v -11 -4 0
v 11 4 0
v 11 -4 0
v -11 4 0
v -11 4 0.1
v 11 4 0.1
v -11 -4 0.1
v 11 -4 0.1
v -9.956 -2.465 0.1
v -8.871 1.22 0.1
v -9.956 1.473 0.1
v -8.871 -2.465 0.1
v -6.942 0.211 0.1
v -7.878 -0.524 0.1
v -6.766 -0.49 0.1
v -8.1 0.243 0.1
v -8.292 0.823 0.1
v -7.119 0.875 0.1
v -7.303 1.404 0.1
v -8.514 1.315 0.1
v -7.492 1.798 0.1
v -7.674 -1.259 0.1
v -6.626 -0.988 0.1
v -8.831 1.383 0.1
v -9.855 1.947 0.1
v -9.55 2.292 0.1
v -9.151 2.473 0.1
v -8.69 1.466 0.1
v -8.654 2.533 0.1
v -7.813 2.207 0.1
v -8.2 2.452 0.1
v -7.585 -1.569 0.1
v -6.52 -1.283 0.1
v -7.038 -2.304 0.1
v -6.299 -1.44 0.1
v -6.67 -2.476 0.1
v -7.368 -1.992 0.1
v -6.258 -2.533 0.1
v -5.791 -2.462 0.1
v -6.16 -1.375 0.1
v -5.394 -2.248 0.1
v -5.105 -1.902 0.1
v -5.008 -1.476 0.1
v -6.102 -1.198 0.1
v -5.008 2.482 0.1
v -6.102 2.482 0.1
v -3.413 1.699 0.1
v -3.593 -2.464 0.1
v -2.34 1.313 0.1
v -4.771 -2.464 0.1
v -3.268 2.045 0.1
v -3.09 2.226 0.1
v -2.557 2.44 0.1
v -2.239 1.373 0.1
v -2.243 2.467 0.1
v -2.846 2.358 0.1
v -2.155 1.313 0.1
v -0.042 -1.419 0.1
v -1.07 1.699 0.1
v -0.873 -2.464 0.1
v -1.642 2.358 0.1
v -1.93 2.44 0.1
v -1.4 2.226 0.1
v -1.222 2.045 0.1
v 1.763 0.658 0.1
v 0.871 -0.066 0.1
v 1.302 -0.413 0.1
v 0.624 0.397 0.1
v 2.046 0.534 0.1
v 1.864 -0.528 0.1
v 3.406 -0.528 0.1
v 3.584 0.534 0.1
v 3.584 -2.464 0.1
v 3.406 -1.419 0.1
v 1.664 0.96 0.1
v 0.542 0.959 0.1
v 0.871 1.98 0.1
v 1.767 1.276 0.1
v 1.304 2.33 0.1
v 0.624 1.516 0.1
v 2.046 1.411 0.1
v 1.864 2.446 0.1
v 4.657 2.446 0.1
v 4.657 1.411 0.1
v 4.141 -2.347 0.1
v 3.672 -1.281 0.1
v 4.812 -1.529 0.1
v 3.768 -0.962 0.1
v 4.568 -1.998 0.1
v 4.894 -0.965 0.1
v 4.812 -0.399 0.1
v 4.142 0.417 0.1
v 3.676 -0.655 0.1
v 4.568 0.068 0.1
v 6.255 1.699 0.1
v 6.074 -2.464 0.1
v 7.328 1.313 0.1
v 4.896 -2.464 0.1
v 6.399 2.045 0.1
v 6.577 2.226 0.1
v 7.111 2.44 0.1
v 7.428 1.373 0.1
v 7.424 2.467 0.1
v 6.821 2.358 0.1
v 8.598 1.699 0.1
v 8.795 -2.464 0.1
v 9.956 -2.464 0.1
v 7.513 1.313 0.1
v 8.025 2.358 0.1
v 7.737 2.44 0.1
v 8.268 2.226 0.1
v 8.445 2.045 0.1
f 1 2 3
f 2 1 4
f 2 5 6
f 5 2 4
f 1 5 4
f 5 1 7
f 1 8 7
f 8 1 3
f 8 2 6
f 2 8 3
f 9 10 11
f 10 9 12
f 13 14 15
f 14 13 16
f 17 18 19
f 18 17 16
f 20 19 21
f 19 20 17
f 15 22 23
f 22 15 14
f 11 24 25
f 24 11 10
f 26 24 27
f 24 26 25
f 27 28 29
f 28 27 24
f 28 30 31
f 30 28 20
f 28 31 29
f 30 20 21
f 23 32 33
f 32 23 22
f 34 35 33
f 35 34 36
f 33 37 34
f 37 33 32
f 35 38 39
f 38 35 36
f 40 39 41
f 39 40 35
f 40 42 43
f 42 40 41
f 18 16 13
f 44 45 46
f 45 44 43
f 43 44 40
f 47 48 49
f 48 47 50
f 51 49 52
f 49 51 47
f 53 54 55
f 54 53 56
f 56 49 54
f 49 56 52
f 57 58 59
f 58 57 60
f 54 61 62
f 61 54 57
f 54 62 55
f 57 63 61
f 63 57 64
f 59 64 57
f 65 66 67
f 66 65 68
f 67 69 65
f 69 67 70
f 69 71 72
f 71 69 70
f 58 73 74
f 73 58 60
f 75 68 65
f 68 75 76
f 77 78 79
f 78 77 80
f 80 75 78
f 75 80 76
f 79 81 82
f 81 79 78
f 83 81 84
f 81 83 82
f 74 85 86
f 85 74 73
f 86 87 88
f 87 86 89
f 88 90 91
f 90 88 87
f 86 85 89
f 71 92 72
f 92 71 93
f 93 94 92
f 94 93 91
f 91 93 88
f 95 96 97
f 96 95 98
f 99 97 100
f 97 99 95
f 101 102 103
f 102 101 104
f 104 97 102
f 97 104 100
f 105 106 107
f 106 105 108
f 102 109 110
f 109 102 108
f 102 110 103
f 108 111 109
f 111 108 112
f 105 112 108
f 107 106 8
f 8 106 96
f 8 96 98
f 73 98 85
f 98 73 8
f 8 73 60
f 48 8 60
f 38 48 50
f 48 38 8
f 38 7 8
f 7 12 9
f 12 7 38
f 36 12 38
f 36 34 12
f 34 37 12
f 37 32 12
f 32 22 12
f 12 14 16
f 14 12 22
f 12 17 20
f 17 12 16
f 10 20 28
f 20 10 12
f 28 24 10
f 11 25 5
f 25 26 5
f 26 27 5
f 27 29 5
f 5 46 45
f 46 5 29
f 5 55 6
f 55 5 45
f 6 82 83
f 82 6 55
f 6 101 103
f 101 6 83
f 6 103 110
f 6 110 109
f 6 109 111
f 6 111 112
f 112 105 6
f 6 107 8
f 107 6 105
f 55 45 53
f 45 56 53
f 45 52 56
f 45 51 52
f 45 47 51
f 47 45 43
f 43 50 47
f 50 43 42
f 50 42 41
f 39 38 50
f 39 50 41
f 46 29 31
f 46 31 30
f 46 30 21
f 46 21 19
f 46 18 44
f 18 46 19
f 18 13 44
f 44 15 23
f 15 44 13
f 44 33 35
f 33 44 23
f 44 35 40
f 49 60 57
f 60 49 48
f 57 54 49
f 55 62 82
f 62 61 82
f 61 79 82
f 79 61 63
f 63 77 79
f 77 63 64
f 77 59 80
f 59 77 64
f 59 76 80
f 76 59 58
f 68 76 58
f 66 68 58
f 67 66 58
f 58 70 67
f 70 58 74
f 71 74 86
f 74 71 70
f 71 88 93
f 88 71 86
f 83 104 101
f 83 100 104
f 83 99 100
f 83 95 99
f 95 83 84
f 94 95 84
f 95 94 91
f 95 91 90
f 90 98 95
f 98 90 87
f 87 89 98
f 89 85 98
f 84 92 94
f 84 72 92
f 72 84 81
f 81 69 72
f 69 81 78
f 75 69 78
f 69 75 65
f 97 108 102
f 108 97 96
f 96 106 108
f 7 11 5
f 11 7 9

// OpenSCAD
// file: ../p/box5-12.scad
use <../lib.scad>
function ldraw_lib__box5_12() = [
// 0 Box with 5 Faces without Any Edges
// 0 Name: box5-12.dat
// 0 Author: Chris Dee [cwdee]
// 0 !LDRAW_ORG Primitive UPDATE 2009-02
// 0 !LICENSE Licensed under CC BY 4.0 : see CAreadme.txt
// 
// 0 BFC CERTIFY CCW
  [0,"BFC","CERTIFY"],
  [0,"BFC","CCW"],
// 
// 0 !HISTORY 2009-09-03 [PTadmin] Official Update 2009-02
// 
// 
// 4 16 1 1 1 1 1 -1 -1 1 -1 -1 1 1
  [4,16,1,1,1,1,1,-1,-1,1,-1,-1,1,1],
// 4 16 -1 0 1 1 0 1 1 1 1 -1 1 1
  [4,16,-1,0,1,1,0,1,1,1,1,-1,1,1],
// 4 16 -1 0 -1 -1 0 1 -1 1 1 -1 1 -1
  [4,16,-1,0,-1,-1,0,1,-1,1,1,-1,1,-1],
// 4 16 1 0 -1 -1 0 -1 -1 1 -1 1 1 -1
  [4,16,1,0,-1,-1,0,-1,-1,1,-1,1,1,-1],
// 4 16 1 0 1 1 0 -1 1 1 -1 1 1 1
  [4,16,1,0,1,1,0,-1,1,1,-1,1,1,1],
// 0
];
module ldraw_lib__box5_12(step=0, col=false, unit=2/5, alt=false, line=0.2, solid=!$preview)
    makepoly(ldraw_lib__box5_12(), step=step, col=col, unit=unit, alt=alt, line=line, solid=solid);
ldraw_lib__box5_12(line=0.2);
// main file
use <../lib.scad>
use <../p/box5-12.scad>
function ldraw_lib__6342851e() = [
// 0 Sticker  1 x  2.8 with Dark Bluish Grey NASA Worm Logo
// 0 Name: 6342851e.dat
// 0 Author: Orion Pobursky [OrionP]
// 0 !LDRAW_ORG Part UPDATE 2024-04
// 0 !LICENSE Licensed under CC BY 4.0 : see CAreadme.txt
// 
// 0 BFC CERTIFY CCW
  [0,"BFC","CERTIFY"],
  [0,"BFC","CCW"],
// 
// 0 !KEYWORDS Discovery, Set 10283, Space Shuttle
// 
// 0 !HISTORY 2024-05-28 [OrionP] Official Update 2024-04
// 
// 
// 1 16 0 -0.25 0 27.5 0 0 0 0.25 0 0 0 10 box5-12.dat
  [1,16,0,-0.25,0,27.5,0,0,0,0.25,0,0,0,10, ldraw_lib__box5_12()],
// 
// 4 72 -24.89 -0.25 -6.1627 -22.1771 -0.25 -6.1627 -22.1771 -0.25 3.0512 -24.89 -0.25 3.6813
  [4,72,-24.89,-0.25,-6.1627,-22.1771,-0.25,-6.1627,-22.1771,-0.25,3.0512,-24.89,-0.25,3.6813],
// 4 72 -17.3544 -0.25 0.5285 -20.2502 -0.25 0.6067 -19.6951 -0.25 -1.3095 -16.916 -0.25 -1.2257
  [4,72,-17.3544,-0.25,0.5285,-20.2502,-0.25,0.6067,-19.6951,-0.25,-1.3095,-16.916,-0.25,-1.2257],
// 4 72 -20.7303 -0.25 2.0563 -20.2502 -0.25 0.6067 -17.7979 -0.25 2.1882 -18.2567 -0.25 3.51
  [4,72,-20.7303,-0.25,2.0563,-20.2502,-0.25,0.6067,-17.7979,-0.25,2.1882,-18.2567,-0.25,3.51],
// 4 72 -21.2854 -0.25 3.2873 -20.7303 -0.25 2.0563 -18.2567 -0.25 3.51 -18.7308 -0.25 4.4956
  [4,72,-21.2854,-0.25,3.2873,-20.7303,-0.25,2.0563,-18.2567,-0.25,3.51,-18.7308,-0.25,4.4956],
// 4 72 -16.916 -0.25 -1.2257 -19.6951 -0.25 -1.3095 -19.185 -0.25 -3.1484 -16.5641 -0.25 -2.4706
  [4,72,-16.916,-0.25,-1.2257,-19.6951,-0.25,-1.3095,-19.185,-0.25,-3.1484,-16.5641,-0.25,-2.4706],
// 4 72 -22.0766 -0.25 3.4581 -24.6363 -0.25 4.8664 -24.89 -0.25 3.6813 -22.1771 -0.25 3.0512
  [4,72,-22.0766,-0.25,3.4581,-24.6363,-0.25,4.8664,-24.89,-0.25,3.6813,-22.1771,-0.25,3.0512],
// 4 72 -23.8752 -0.25 5.7303 -24.6363 -0.25 4.8664 -22.0766 -0.25 3.4581 -22.878 -0.25 6.1826
  [4,72,-23.8752,-0.25,5.7303,-24.6363,-0.25,4.8664,-22.0766,-0.25,3.4581,-22.878,-0.25,6.1826],
// 4 72 -22.878 -0.25 6.1826 -22.0766 -0.25 3.4581 -21.7248 -0.25 3.6641 -21.6345 -0.25 6.3331
  [4,72,-22.878,-0.25,6.1826,-22.0766,-0.25,3.4581,-21.7248,-0.25,3.6641,-21.6345,-0.25,6.3331],
// 4 72 -21.7248 -0.25 3.6641 -21.2854 -0.25 3.2873 -19.5313 -0.25 5.5164 -20.4993 -0.25 6.1289
  [4,72,-21.7248,-0.25,3.6641,-21.2854,-0.25,3.2873,-19.5313,-0.25,5.5164,-20.4993,-0.25,6.1289],
// 3 72 -21.7248 -0.25 3.6641 -20.4993 -0.25 6.1289 -21.6345 -0.25 6.3331
  [3,72,-21.7248,-0.25,3.6641,-20.4993,-0.25,6.1289,-21.6345,-0.25,6.3331],
// 3 72 -19.5313 -0.25 5.5164 -21.2854 -0.25 3.2873 -18.7308 -0.25 4.4956
  [3,72,-19.5313,-0.25,5.5164,-21.2854,-0.25,3.2873,-18.7308,-0.25,4.4956],
// 4 72 -16.5641 -0.25 -2.4706 -19.185 -0.25 -3.1484 -18.9613 -0.25 -3.922 -16.2993 -0.25 -3.2072
  [4,72,-16.5641,-0.25,-2.4706,-19.185,-0.25,-3.1484,-18.9613,-0.25,-3.922,-16.2993,-0.25,-3.2072],
// 4 72 -17.5947 -0.25 -5.7604 -16.6752 -0.25 -6.19 -15.747 -0.25 -3.5988 -16.2993 -0.25 -3.2072
  [4,72,-17.5947,-0.25,-5.7604,-16.6752,-0.25,-6.19,-15.747,-0.25,-3.5988,-16.2993,-0.25,-3.2072],
// 4 72 -18.4188 -0.25 -4.9794 -17.5947 -0.25 -5.7604 -16.2993 -0.25 -3.2072 -18.9613 -0.25 -3.922
  [4,72,-18.4188,-0.25,-4.9794,-17.5947,-0.25,-5.7604,-16.2993,-0.25,-3.2072,-18.9613,-0.25,-3.922],
// 4 72 -15.747 -0.25 -3.5988 -16.6752 -0.25 -6.19 -15.6451 -0.25 -6.3331 -14.4771 -0.25 -6.1549
  [4,72,-15.747,-0.25,-3.5988,-16.6752,-0.25,-6.19,-15.6451,-0.25,-6.3331,-14.4771,-0.25,-6.1549],
// 4 72 -15.4002 -0.25 -3.4382 -15.747 -0.25 -3.5988 -14.4771 -0.25 -6.1549 -13.485 -0.25 -5.6197
  [4,72,-15.4002,-0.25,-3.4382,-15.747,-0.25,-3.5988,-14.4771,-0.25,-6.1549,-13.485,-0.25,-5.6197],
// 4 72 -15.4002 -0.25 -3.4382 -13.485 -0.25 -5.6197 -12.7613 -0.25 -4.7558 -12.5201 -0.25 -3.691
  [4,72,-15.4002,-0.25,-3.4382,-13.485,-0.25,-5.6197,-12.7613,-0.25,-4.7558,-12.5201,-0.25,-3.691],
// 3 72 -17.7979 -0.25 2.1882 -20.2502 -0.25 0.6067 -17.3544 -0.25 0.5285
  [3,72,-17.7979,-0.25,2.1882,-20.2502,-0.25,0.6067,-17.3544,-0.25,0.5285],
// 4 72 -12.5201 -0.25 6.2049 -15.2544 -0.25 6.2049 -15.2544 -0.25 -2.9961 -12.5201 -0.25 -3.691
  [4,72,-12.5201,-0.25,6.2049,-15.2544,-0.25,6.2049,-15.2544,-0.25,-2.9961,-12.5201,-0.25,-3.691],
// 3 72 -12.5201 -0.25 -3.691 -15.2544 -0.25 -2.9961 -15.4002 -0.25 -3.4382
  [3,72,-12.5201,-0.25,-3.691,-15.2544,-0.25,-2.9961,-15.4002,-0.25,-3.4382],
// 4 72 -8.5317 -0.25 4.2479 -11.9275 -0.25 -6.1595 -8.9836 -0.25 -6.1595 -5.8488 -0.25 3.2817
  [4,72,-8.5317,-0.25,4.2479,-11.9275,-0.25,-6.1595,-8.9836,-0.25,-6.1595,-5.8488,-0.25,3.2817],
// 4 72 -5.8488 -0.25 3.2817 -7.7252 -0.25 5.5641 -8.1697 -0.25 5.1118 -8.5317 -0.25 4.2479
  [4,72,-5.8488,-0.25,3.2817,-7.7252,-0.25,5.5641,-8.1697,-0.25,5.1118,-8.5317,-0.25,4.2479],
// 4 72 -6.3914 -0.25 6.0988 -7.115 -0.25 5.8956 -5.5979 -0.25 3.4326 -5.6076 -0.25 6.1669
  [4,72,-6.3914,-0.25,6.0988,-7.115,-0.25,5.8956,-5.5979,-0.25,3.4326,-5.6076,-0.25,6.1669],
// 4 72 -7.115 -0.25 5.8956 -7.7252 -0.25 5.5641 -5.8488 -0.25 3.2817 -5.5979 -0.25 3.4326
  [4,72,-7.115,-0.25,5.8956,-7.7252,-0.25,5.5641,-5.8488,-0.25,3.2817,-5.5979,-0.25,3.4326],
// 4 72 -2.1817 -0.25 -6.1595 -0.1043 -0.25 -3.5484 -2.6743 -0.25 4.2479 -5.3868 -0.25 3.2817
  [4,72,-2.1817,-0.25,-6.1595,-0.1043,-0.25,-3.5484,-2.6743,-0.25,4.2479,-5.3868,-0.25,3.2817],
// 4 72 -4.1058 -0.25 5.8956 -4.8257 -0.25 6.0988 -5.5979 -0.25 3.4326 -5.3868 -0.25 3.2817
  [4,72,-4.1058,-0.25,5.8956,-4.8257,-0.25,6.0988,-5.5979,-0.25,3.4326,-5.3868,-0.25,3.2817],
// 3 72 -5.5979 -0.25 3.4326 -4.8257 -0.25 6.0988 -5.6076 -0.25 6.1669
  [3,72,-5.5979,-0.25,3.4326,-4.8257,-0.25,6.0988,-5.6076,-0.25,6.1669],
// 4 72 -5.3868 -0.25 3.2817 -3.0558 -0.25 5.1118 -3.4993 -0.25 5.5641 -4.1058 -0.25 5.8956
  [4,72,-5.3868,-0.25,3.2817,-3.0558,-0.25,5.1118,-3.4993,-0.25,5.5641,-4.1058,-0.25,5.8956],
// 3 72 -2.6743 -0.25 4.2479 -3.0558 -0.25 5.1118 -5.3868 -0.25 3.2817
  [3,72,-2.6743,-0.25,4.2479,-3.0558,-0.25,5.1118,-5.3868,-0.25,3.2817],
// 4 72 4.4072 -0.25 1.6461 1.5604 -0.25 0.9937 2.178 -0.25 -0.1646 3.2553 -0.25 -1.0313
  [4,72,4.4072,-0.25,1.6461,1.5604,-0.25,0.9937,2.178,-0.25,-0.1646,3.2553,-0.25,-1.0313],
// 4 72 3.2553 -0.25 -1.0313 4.659 -0.25 -1.3201 5.115 -0.25 1.3345 4.4072 -0.25 1.6461
  [4,72,3.2553,-0.25,-1.0313,4.659,-0.25,-1.3201,5.115,-0.25,1.3345,4.4072,-0.25,1.6461],
// 4 72 5.115 -0.25 1.3345 4.659 -0.25 -1.3201 8.516 -0.25 -1.3201 8.9609 -0.25 1.3345
  [4,72,5.115,-0.25,1.3345,4.659,-0.25,-1.3201,8.516,-0.25,-1.3201,8.9609,-0.25,1.3345],
// 4 72 8.516 -0.25 -3.5484 -0.1043 -0.25 -3.5484 -2.1817 -0.25 -6.1595 8.959 -0.25 -6.1595
  [4,72,8.516,-0.25,-3.5484,-0.1043,-0.25,-3.5484,-2.1817,-0.25,-6.1595,8.959,-0.25,-6.1595],
// 4 72 1.5604 -0.25 0.9937 4.4072 -0.25 1.6461 4.1609 -0.25 2.4002 1.3544 -0.25 2.3979
  [4,72,1.5604,-0.25,0.9937,4.4072,-0.25,1.6461,4.1609,-0.25,2.4002,1.3544,-0.25,2.3979],
// 4 72 2.178 -0.25 4.9507 1.5604 -0.25 3.7896 4.4169 -0.25 3.1896 3.2609 -0.25 5.8248
  [4,72,2.178,-0.25,4.9507,1.5604,-0.25,3.7896,4.4169,-0.25,3.1896,3.2609,-0.25,5.8248],
// 4 72 1.5604 -0.25 3.7896 1.3544 -0.25 2.3979 4.1609 -0.25 2.4002 4.4169 -0.25 3.1896
  [4,72,1.5604,-0.25,3.7896,1.3544,-0.25,2.3979,4.1609,-0.25,2.4002,4.4169,-0.25,3.1896],
// 4 72 3.2609 -0.25 5.8248 4.4169 -0.25 3.1896 5.115 -0.25 3.5266 4.66 -0.25 6.116
  [4,72,3.2609,-0.25,5.8248,4.4169,-0.25,3.1896,5.115,-0.25,3.5266,4.66,-0.25,6.116],
// 4 72 11.6424 -0.25 6.116 4.66 -0.25 6.116 5.115 -0.25 3.5266 11.6424 -0.25 3.5266
  [4,72,11.6424,-0.25,6.116,4.66,-0.25,6.116,5.115,-0.25,3.5266,11.6424,-0.25,3.5266],
// 4 72 10.353 -0.25 -5.8683 9.1789 -0.25 -3.2021 8.516 -0.25 -3.5484 8.959 -0.25 -6.1595
  [4,72,10.353,-0.25,-5.8683,9.1789,-0.25,-3.2021,8.516,-0.25,-3.5484,8.959,-0.25,-6.1595],
// 4 72 12.0308 -0.25 -3.8215 9.4201 -0.25 -2.4039 9.1789 -0.25 -3.2021 11.4201 -0.25 -4.9942
  [4,72,12.0308,-0.25,-3.8215,9.4201,-0.25,-2.4039,9.1789,-0.25,-3.2021,11.4201,-0.25,-4.9942],
// 4 72 9.4201 -0.25 -2.4039 12.0308 -0.25 -3.8215 12.234 -0.25 -2.4123 12.0308 -0.25 -0.9984
  [4,72,9.4201,-0.25,-2.4039,12.0308,-0.25,-3.8215,12.234,-0.25,-2.4123,12.0308,-0.25,-0.9984],
// 3 72 9.1789 -0.25 -3.2021 10.353 -0.25 -5.8683 11.4201 -0.25 -4.9942
  [3,72,9.1789,-0.25,-3.2021,10.353,-0.25,-5.8683,11.4201,-0.25,-4.9942],
// 4 72 8.516 -0.25 -1.3201 9.1891 -0.25 -1.6363 10.3539 -0.25 1.0433 8.9609 -0.25 1.3345
  [4,72,8.516,-0.25,-1.3201,9.1891,-0.25,-1.6363,10.3539,-0.25,1.0433,8.9609,-0.25,1.3345],
// 4 72 11.4206 -0.25 0.1692 10.3539 -0.25 1.0433 9.1891 -0.25 -1.6363 12.0308 -0.25 -0.9984
  [4,72,11.4206,-0.25,0.1692,10.3539,-0.25,1.0433,9.1891,-0.25,-1.6363,12.0308,-0.25,-0.9984],
// 3 72 12.0308 -0.25 -0.9984 9.1891 -0.25 -1.6363 9.4201 -0.25 -2.4039
  [3,72,12.0308,-0.25,-0.9984,9.1891,-0.25,-1.6363,9.4201,-0.25,-2.4039],
// 4 72 15.6363 -0.25 4.2479 12.241 -0.25 -6.1595 15.1845 -0.25 -6.1595 18.3192 -0.25 3.2817
  [4,72,15.6363,-0.25,4.2479,12.241,-0.25,-6.1595,15.1845,-0.25,-6.1595,18.3192,-0.25,3.2817],
// 4 72 18.3192 -0.25 3.2817 16.4428 -0.25 5.5641 15.9984 -0.25 5.1118 15.6363 -0.25 4.2479
  [4,72,18.3192,-0.25,3.2817,16.4428,-0.25,5.5641,15.9984,-0.25,5.1118,15.6363,-0.25,4.2479],
// 4 72 17.7766 -0.25 6.0988 17.053 -0.25 5.8956 18.5701 -0.25 3.4326 18.5604 -0.25 6.1669
  [4,72,17.7766,-0.25,6.0988,17.053,-0.25,5.8956,18.5701,-0.25,3.4326,18.5604,-0.25,6.1669],
// 4 72 17.053 -0.25 5.8956 16.4428 -0.25 5.5641 18.3192 -0.25 3.2817 18.5701 -0.25 3.4326
  [4,72,17.053,-0.25,5.8956,16.4428,-0.25,5.5641,18.3192,-0.25,3.2817,18.5701,-0.25,3.4326],
// 4 72 21.9863 -0.25 -6.1595 24.89 -0.25 -6.1595 21.4938 -0.25 4.2479 18.7813 -0.25 3.2817
  [4,72,21.9863,-0.25,-6.1595,24.89,-0.25,-6.1595,21.4938,-0.25,4.2479,18.7813,-0.25,3.2817],
// 4 72 20.0623 -0.25 5.8956 19.3428 -0.25 6.0988 18.5701 -0.25 3.4326 18.7813 -0.25 3.2817
  [4,72,20.0623,-0.25,5.8956,19.3428,-0.25,6.0988,18.5701,-0.25,3.4326,18.7813,-0.25,3.2817],
// 3 72 18.5701 -0.25 3.4326 19.3428 -0.25 6.0988 18.5604 -0.25 6.1669
  [3,72,18.5701,-0.25,3.4326,19.3428,-0.25,6.0988,18.5604,-0.25,6.1669],
// 4 72 18.7813 -0.25 3.2817 21.1123 -0.25 5.1118 20.6688 -0.25 5.5641 20.0623 -0.25 5.8956
  [4,72,18.7813,-0.25,3.2817,21.1123,-0.25,5.1118,20.6688,-0.25,5.5641,20.0623,-0.25,5.8956],
// 3 72 21.4938 -0.25 4.2479 21.1123 -0.25 5.1118 18.7813 -0.25 3.2817
  [3,72,21.4938,-0.25,4.2479,21.1123,-0.25,5.1118,18.7813,-0.25,3.2817],
// 
// 3 15 24.89 -0.25 -6.1595 21.9863 -0.25 -6.1595 27.5 -0.25 -10
  [3,15,24.89,-0.25,-6.1595,21.9863,-0.25,-6.1595,27.5,-0.25,-10],
// 3 15 27.5 -0.25 -10 21.9863 -0.25 -6.1595 15.1845 -0.25 -6.1595
  [3,15,27.5,-0.25,-10,21.9863,-0.25,-6.1595,15.1845,-0.25,-6.1595],
// 3 15 27.5 -0.25 -10 15.1845 -0.25 -6.1595 12.241 -0.25 -6.1595
  [3,15,27.5,-0.25,-10,15.1845,-0.25,-6.1595,12.241,-0.25,-6.1595],
// 4 15 8.959 -0.25 -6.1595 27.5 -0.25 -10 12.241 -0.25 -6.1595 10.353 -0.25 -5.8683
  [4,15,8.959,-0.25,-6.1595,27.5,-0.25,-10,12.241,-0.25,-6.1595,10.353,-0.25,-5.8683],
// 3 15 27.5 -0.25 -10 8.959 -0.25 -6.1595 -2.1817 -0.25 -6.1595
  [3,15,27.5,-0.25,-10,8.959,-0.25,-6.1595,-2.1817,-0.25,-6.1595],
// 3 15 -8.9836 -0.25 -6.1595 27.5 -0.25 -10 -2.1817 -0.25 -6.1595
  [3,15,-8.9836,-0.25,-6.1595,27.5,-0.25,-10,-2.1817,-0.25,-6.1595],
// 4 15 27.5 -0.25 -10 -8.9836 -0.25 -6.1595 -11.9275 -0.25 -6.1595 -15.6451 -0.25 -6.3331
  [4,15,27.5,-0.25,-10,-8.9836,-0.25,-6.1595,-11.9275,-0.25,-6.1595,-15.6451,-0.25,-6.3331],
// 3 15 -15.6451 -0.25 -6.3331 -27.5 -0.25 -10 27.5 -0.25 -10
  [3,15,-15.6451,-0.25,-6.3331,-27.5,-0.25,-10,27.5,-0.25,-10],
// 4 15 -27.5 -0.25 -10 -15.6451 -0.25 -6.3331 -22.1771 -0.25 -6.1627 -24.89 -0.25 -6.1627
  [4,15,-27.5,-0.25,-10,-15.6451,-0.25,-6.3331,-22.1771,-0.25,-6.1627,-24.89,-0.25,-6.1627],
// 3 15 -16.6752 -0.25 -6.19 -22.1771 -0.25 -6.1627 -15.6451 -0.25 -6.3331
  [3,15,-16.6752,-0.25,-6.19,-22.1771,-0.25,-6.1627,-15.6451,-0.25,-6.3331],
// 3 15 -16.6752 -0.25 -6.19 -17.5947 -0.25 -5.7604 -22.1771 -0.25 -6.1627
  [3,15,-16.6752,-0.25,-6.19,-17.5947,-0.25,-5.7604,-22.1771,-0.25,-6.1627],
// 3 15 -17.5947 -0.25 -5.7604 -18.4188 -0.25 -4.9794 -22.1771 -0.25 -6.1627
  [3,15,-17.5947,-0.25,-5.7604,-18.4188,-0.25,-4.9794,-22.1771,-0.25,-6.1627],
// 3 15 -18.4188 -0.25 -4.9794 -18.9613 -0.25 -3.922 -22.1771 -0.25 -6.1627
  [3,15,-18.4188,-0.25,-4.9794,-18.9613,-0.25,-3.922,-22.1771,-0.25,-6.1627],
// 3 15 -18.9613 -0.25 -3.922 -19.185 -0.25 -3.1484 -22.1771 -0.25 -6.1627
  [3,15,-18.9613,-0.25,-3.922,-19.185,-0.25,-3.1484,-22.1771,-0.25,-6.1627],
// 4 15 -22.1771 -0.25 -6.1627 -19.185 -0.25 -3.1484 -19.6951 -0.25 -1.3095 -20.2502 -0.25 0.6067
  [4,15,-22.1771,-0.25,-6.1627,-19.185,-0.25,-3.1484,-19.6951,-0.25,-1.3095,-20.2502,-0.25,0.6067],
// 4 15 -22.1771 -0.25 -6.1627 -20.2502 -0.25 0.6067 -20.7303 -0.25 2.0563 -21.2854 -0.25 3.2873
  [4,15,-22.1771,-0.25,-6.1627,-20.2502,-0.25,0.6067,-20.7303,-0.25,2.0563,-21.2854,-0.25,3.2873],
// 4 15 -22.1771 -0.25 3.0512 -22.1771 -0.25 -6.1627 -21.2854 -0.25 3.2873 -21.7248 -0.25 3.6641
  [4,15,-22.1771,-0.25,3.0512,-22.1771,-0.25,-6.1627,-21.2854,-0.25,3.2873,-21.7248,-0.25,3.6641],
// 3 15 -21.7248 -0.25 3.6641 -22.0766 -0.25 3.4581 -22.1771 -0.25 3.0512
  [3,15,-21.7248,-0.25,3.6641,-22.0766,-0.25,3.4581,-22.1771,-0.25,3.0512],
// 3 15 -24.89 -0.25 3.6813 -24.6363 -0.25 4.8664 -27.5 -0.25 10
  [3,15,-24.89,-0.25,3.6813,-24.6363,-0.25,4.8664,-27.5,-0.25,10],
// 3 15 -24.6363 -0.25 4.8664 -23.8752 -0.25 5.7303 -27.5 -0.25 10
  [3,15,-24.6363,-0.25,4.8664,-23.8752,-0.25,5.7303,-27.5,-0.25,10],
// 3 15 -23.8752 -0.25 5.7303 -22.878 -0.25 6.1826 -27.5 -0.25 10
  [3,15,-23.8752,-0.25,5.7303,-22.878,-0.25,6.1826,-27.5,-0.25,10],
// 3 15 -22.878 -0.25 6.1826 -21.6345 -0.25 6.3331 -27.5 -0.25 10
  [3,15,-22.878,-0.25,6.1826,-21.6345,-0.25,6.3331,-27.5,-0.25,10],
// 4 15 -27.5 -0.25 10 -21.6345 -0.25 6.3331 -15.2544 -0.25 6.2049 -12.5201 -0.25 6.2049
  [4,15,-27.5,-0.25,10,-21.6345,-0.25,6.3331,-15.2544,-0.25,6.2049,-12.5201,-0.25,6.2049],
// 4 15 27.5 -0.25 10 -27.5 -0.25 10 -12.5201 -0.25 6.2049 -5.6076 -0.25 6.1669
  [4,15,27.5,-0.25,10,-27.5,-0.25,10,-12.5201,-0.25,6.2049,-5.6076,-0.25,6.1669],
// 4 15 27.5 -0.25 10 -5.6076 -0.25 6.1669 4.66 -0.25 6.116 11.6424 -0.25 6.116
  [4,15,27.5,-0.25,10,-5.6076,-0.25,6.1669,4.66,-0.25,6.116,11.6424,-0.25,6.116],
// 4 15 18.5604 -0.25 6.1669 27.5 -0.25 10 11.6424 -0.25 6.116 17.7766 -0.25 6.0988
  [4,15,18.5604,-0.25,6.1669,27.5,-0.25,10,11.6424,-0.25,6.116,17.7766,-0.25,6.0988],
// 3 15 27.5 -0.25 10 18.5604 -0.25 6.1669 19.3428 -0.25 6.0988
  [3,15,27.5,-0.25,10,18.5604,-0.25,6.1669,19.3428,-0.25,6.0988],
// 3 15 27.5 -0.25 10 19.3428 -0.25 6.0988 20.0623 -0.25 5.8956
  [3,15,27.5,-0.25,10,19.3428,-0.25,6.0988,20.0623,-0.25,5.8956],
// 3 15 27.5 -0.25 10 20.0623 -0.25 5.8956 20.6688 -0.25 5.5641
  [3,15,27.5,-0.25,10,20.0623,-0.25,5.8956,20.6688,-0.25,5.5641],
// 3 15 27.5 -0.25 10 20.6688 -0.25 5.5641 21.1123 -0.25 5.1118
  [3,15,27.5,-0.25,10,20.6688,-0.25,5.5641,21.1123,-0.25,5.1118],
// 3 15 21.1123 -0.25 5.1118 21.4938 -0.25 4.2479 27.5 -0.25 10
  [3,15,21.1123,-0.25,5.1118,21.4938,-0.25,4.2479,27.5,-0.25,10],
// 4 15 24.89 -0.25 -6.1595 27.5 -0.25 -10 27.5 -0.25 10 21.4938 -0.25 4.2479
  [4,15,24.89,-0.25,-6.1595,27.5,-0.25,-10,27.5,-0.25,10,21.4938,-0.25,4.2479],
// 3 15 -5.6076 -0.25 6.1669 -12.5201 -0.25 6.2049 -6.3914 -0.25 6.0988
  [3,15,-5.6076,-0.25,6.1669,-12.5201,-0.25,6.2049,-6.3914,-0.25,6.0988],
// 3 15 -12.5201 -0.25 6.2049 -7.115 -0.25 5.8956 -6.3914 -0.25 6.0988
  [3,15,-12.5201,-0.25,6.2049,-7.115,-0.25,5.8956,-6.3914,-0.25,6.0988],
// 3 15 -12.5201 -0.25 6.2049 -7.7252 -0.25 5.5641 -7.115 -0.25 5.8956
  [3,15,-12.5201,-0.25,6.2049,-7.7252,-0.25,5.5641,-7.115,-0.25,5.8956],
// 3 15 -12.5201 -0.25 6.2049 -8.1697 -0.25 5.1118 -7.7252 -0.25 5.5641
  [3,15,-12.5201,-0.25,6.2049,-8.1697,-0.25,5.1118,-7.7252,-0.25,5.5641],
// 4 15 -8.5317 -0.25 4.2479 -8.1697 -0.25 5.1118 -12.5201 -0.25 6.2049 -12.5201 -0.25 -3.691
  [4,15,-8.5317,-0.25,4.2479,-8.1697,-0.25,5.1118,-12.5201,-0.25,6.2049,-12.5201,-0.25,-3.691],
// 4 15 -11.9275 -0.25 -6.1595 -8.5317 -0.25 4.2479 -12.5201 -0.25 -3.691 -12.7613 -0.25 -4.7558
  [4,15,-11.9275,-0.25,-6.1595,-8.5317,-0.25,4.2479,-12.5201,-0.25,-3.691,-12.7613,-0.25,-4.7558],
// 3 15 -11.9275 -0.25 -6.1595 -12.7613 -0.25 -4.7558 -13.485 -0.25 -5.6197
  [3,15,-11.9275,-0.25,-6.1595,-12.7613,-0.25,-4.7558,-13.485,-0.25,-5.6197],
// 3 15 -14.4771 -0.25 -6.1549 -15.6451 -0.25 -6.3331 -11.9275 -0.25 -6.1595
  [3,15,-14.4771,-0.25,-6.1549,-15.6451,-0.25,-6.3331,-11.9275,-0.25,-6.1595],
// 3 15 -14.4771 -0.25 -6.1549 -11.9275 -0.25 -6.1595 -13.485 -0.25 -5.6197
  [3,15,-14.4771,-0.25,-6.1549,-11.9275,-0.25,-6.1595,-13.485,-0.25,-5.6197],
// 3 15 -15.2544 -0.25 6.2049 -21.6345 -0.25 6.3331 -20.4993 -0.25 6.1289
  [3,15,-15.2544,-0.25,6.2049,-21.6345,-0.25,6.3331,-20.4993,-0.25,6.1289],
// 3 15 -15.2544 -0.25 6.2049 -20.4993 -0.25 6.1289 -19.5313 -0.25 5.5164
  [3,15,-15.2544,-0.25,6.2049,-20.4993,-0.25,6.1289,-19.5313,-0.25,5.5164],
// 3 15 -15.2544 -0.25 6.2049 -19.5313 -0.25 5.5164 -18.7308 -0.25 4.4956
  [3,15,-15.2544,-0.25,6.2049,-19.5313,-0.25,5.5164,-18.7308,-0.25,4.4956],
// 3 15 -15.2544 -0.25 6.2049 -18.7308 -0.25 4.4956 -18.2567 -0.25 3.51
  [3,15,-15.2544,-0.25,6.2049,-18.7308,-0.25,4.4956,-18.2567,-0.25,3.51],
// 4 15 -15.2544 -0.25 6.2049 -18.2567 -0.25 3.51 -17.7979 -0.25 2.1882 -15.2544 -0.25 -2.9961
  [4,15,-15.2544,-0.25,6.2049,-18.2567,-0.25,3.51,-17.7979,-0.25,2.1882,-15.2544,-0.25,-2.9961],
// 3 15 -17.7979 -0.25 2.1882 -17.3544 -0.25 0.5285 -15.2544 -0.25 -2.9961
  [3,15,-17.7979,-0.25,2.1882,-17.3544,-0.25,0.5285,-15.2544,-0.25,-2.9961],
// 4 15 -15.2544 -0.25 -2.9961 -17.3544 -0.25 0.5285 -16.916 -0.25 -1.2257 -16.5641 -0.25 -2.4706
  [4,15,-15.2544,-0.25,-2.9961,-17.3544,-0.25,0.5285,-16.916,-0.25,-1.2257,-16.5641,-0.25,-2.4706],
// 4 15 -15.2544 -0.25 -2.9961 -16.5641 -0.25 -2.4706 -16.2993 -0.25 -3.2072 -15.747 -0.25 -3.5988
  [4,15,-15.2544,-0.25,-2.9961,-16.5641,-0.25,-2.4706,-16.2993,-0.25,-3.2072,-15.747,-0.25,-3.5988],
// 3 15 -15.2544 -0.25 -2.9961 -15.747 -0.25 -3.5988 -15.4002 -0.25 -3.4382
  [3,15,-15.2544,-0.25,-2.9961,-15.747,-0.25,-3.5988,-15.4002,-0.25,-3.4382],
// 4 15 -5.8488 -0.25 3.2817 -8.9836 -0.25 -6.1595 -2.1817 -0.25 -6.1595 -5.3868 -0.25 3.2817
  [4,15,-5.8488,-0.25,3.2817,-8.9836,-0.25,-6.1595,-2.1817,-0.25,-6.1595,-5.3868,-0.25,3.2817],
// 3 15 -5.3868 -0.25 3.2817 -5.5979 -0.25 3.4326 -5.8488 -0.25 3.2817
  [3,15,-5.3868,-0.25,3.2817,-5.5979,-0.25,3.4326,-5.8488,-0.25,3.2817],
// 3 15 -5.6076 -0.25 6.1669 -4.8257 -0.25 6.0988 4.66 -0.25 6.116
  [3,15,-5.6076,-0.25,6.1669,-4.8257,-0.25,6.0988,4.66,-0.25,6.116],
// 3 15 -4.8257 -0.25 6.0988 -4.1058 -0.25 5.8956 4.66 -0.25 6.116
  [3,15,-4.8257,-0.25,6.0988,-4.1058,-0.25,5.8956,4.66,-0.25,6.116],
// 4 15 4.66 -0.25 6.116 -4.1058 -0.25 5.8956 -3.4993 -0.25 5.5641 3.2609 -0.25 5.8248
  [4,15,4.66,-0.25,6.116,-4.1058,-0.25,5.8956,-3.4993,-0.25,5.5641,3.2609,-0.25,5.8248],
// 4 15 3.2609 -0.25 5.8248 -3.4993 -0.25 5.5641 -3.0558 -0.25 5.1118 2.178 -0.25 4.9507
  [4,15,3.2609,-0.25,5.8248,-3.4993,-0.25,5.5641,-3.0558,-0.25,5.1118,2.178,-0.25,4.9507],
// 4 15 2.178 -0.25 4.9507 -3.0558 -0.25 5.1118 -2.6743 -0.25 4.2479 1.5604 -0.25 3.7896
  [4,15,2.178,-0.25,4.9507,-3.0558,-0.25,5.1118,-2.6743,-0.25,4.2479,1.5604,-0.25,3.7896],
// 4 15 1.3544 -0.25 2.3979 1.5604 -0.25 3.7896 -2.6743 -0.25 4.2479 -0.1043 -0.25 -3.5484
  [4,15,1.3544,-0.25,2.3979,1.5604,-0.25,3.7896,-2.6743,-0.25,4.2479,-0.1043,-0.25,-3.5484],
// 3 15 1.5604 -0.25 0.9937 1.3544 -0.25 2.3979 -0.1043 -0.25 -3.5484
  [3,15,1.5604,-0.25,0.9937,1.3544,-0.25,2.3979,-0.1043,-0.25,-3.5484],
// 3 15 2.178 -0.25 -0.1646 1.5604 -0.25 0.9937 -0.1043 -0.25 -3.5484
  [3,15,2.178,-0.25,-0.1646,1.5604,-0.25,0.9937,-0.1043,-0.25,-3.5484],
// 3 15 3.2553 -0.25 -1.0313 2.178 -0.25 -0.1646 -0.1043 -0.25 -3.5484
  [3,15,3.2553,-0.25,-1.0313,2.178,-0.25,-0.1646,-0.1043,-0.25,-3.5484],
// 4 15 4.659 -0.25 -1.3201 3.2553 -0.25 -1.0313 -0.1043 -0.25 -3.5484 8.516 -0.25 -3.5484
  [4,15,4.659,-0.25,-1.3201,3.2553,-0.25,-1.0313,-0.1043,-0.25,-3.5484,8.516,-0.25,-3.5484],
// 4 15 8.516 -0.25 -1.3201 4.659 -0.25 -1.3201 8.516 -0.25 -3.5484 9.1789 -0.25 -3.2021
  [4,15,8.516,-0.25,-1.3201,4.659,-0.25,-1.3201,8.516,-0.25,-3.5484,9.1789,-0.25,-3.2021],
// 4 15 9.1891 -0.25 -1.6363 8.516 -0.25 -1.3201 9.1789 -0.25 -3.2021 9.4201 -0.25 -2.4039
  [4,15,9.1891,-0.25,-1.6363,8.516,-0.25,-1.3201,9.1789,-0.25,-3.2021,9.4201,-0.25,-2.4039],
// 3 15 11.6424 -0.25 6.116 17.053 -0.25 5.8956 17.7766 -0.25 6.0988
  [3,15,11.6424,-0.25,6.116,17.053,-0.25,5.8956,17.7766,-0.25,6.0988],
// 3 15 11.6424 -0.25 6.116 16.4428 -0.25 5.5641 17.053 -0.25 5.8956
  [3,15,11.6424,-0.25,6.116,16.4428,-0.25,5.5641,17.053,-0.25,5.8956],
// 3 15 11.6424 -0.25 6.116 15.9984 -0.25 5.1118 16.4428 -0.25 5.5641
  [3,15,11.6424,-0.25,6.116,15.9984,-0.25,5.1118,16.4428,-0.25,5.5641],
// 4 15 15.6363 -0.25 4.2479 15.9984 -0.25 5.1118 11.6424 -0.25 6.116 11.6424 -0.25 3.5266
  [4,15,15.6363,-0.25,4.2479,15.9984,-0.25,5.1118,11.6424,-0.25,6.116,11.6424,-0.25,3.5266],
// 4 15 15.6363 -0.25 4.2479 11.6424 -0.25 3.5266 11.4206 -0.25 0.1692 12.0308 -0.25 -0.9984
  [4,15,15.6363,-0.25,4.2479,11.6424,-0.25,3.5266,11.4206,-0.25,0.1692,12.0308,-0.25,-0.9984],
// 3 15 15.6363 -0.25 4.2479 12.0308 -0.25 -0.9984 12.234 -0.25 -2.4123
  [3,15,15.6363,-0.25,4.2479,12.0308,-0.25,-0.9984,12.234,-0.25,-2.4123],
// 4 15 12.241 -0.25 -6.1595 15.6363 -0.25 4.2479 12.234 -0.25 -2.4123 12.0308 -0.25 -3.8215
  [4,15,12.241,-0.25,-6.1595,15.6363,-0.25,4.2479,12.234,-0.25,-2.4123,12.0308,-0.25,-3.8215],
// 3 15 12.0308 -0.25 -3.8215 11.4201 -0.25 -4.9942 12.241 -0.25 -6.1595
  [3,15,12.0308,-0.25,-3.8215,11.4201,-0.25,-4.9942,12.241,-0.25,-6.1595],
// 3 15 11.4201 -0.25 -4.9942 10.353 -0.25 -5.8683 12.241 -0.25 -6.1595
  [3,15,11.4201,-0.25,-4.9942,10.353,-0.25,-5.8683,12.241,-0.25,-6.1595],
// 3 15 11.6424 -0.25 3.5266 10.3539 -0.25 1.0433 11.4206 -0.25 0.1692
  [3,15,11.6424,-0.25,3.5266,10.3539,-0.25,1.0433,11.4206,-0.25,0.1692],
// 4 15 8.9609 -0.25 1.3345 10.3539 -0.25 1.0433 11.6424 -0.25 3.5266 5.115 -0.25 3.5266
  [4,15,8.9609,-0.25,1.3345,10.3539,-0.25,1.0433,11.6424,-0.25,3.5266,5.115,-0.25,3.5266],
// 4 15 5.115 -0.25 1.3345 8.9609 -0.25 1.3345 5.115 -0.25 3.5266 4.4169 -0.25 3.1896
  [4,15,5.115,-0.25,1.3345,8.9609,-0.25,1.3345,5.115,-0.25,3.5266,4.4169,-0.25,3.1896],
// 4 15 4.4072 -0.25 1.6461 5.115 -0.25 1.3345 4.4169 -0.25 3.1896 4.1609 -0.25 2.4002
  [4,15,4.4072,-0.25,1.6461,5.115,-0.25,1.3345,4.4169,-0.25,3.1896,4.1609,-0.25,2.4002],
// 4 15 18.7813 -0.25 3.2817 18.5701 -0.25 3.4326 18.3192 -0.25 3.2817 15.1845 -0.25 -6.1595
  [4,15,18.7813,-0.25,3.2817,18.5701,-0.25,3.4326,18.3192,-0.25,3.2817,15.1845,-0.25,-6.1595],
// 3 15 15.1845 -0.25 -6.1595 21.9863 -0.25 -6.1595 18.7813 -0.25 3.2817
  [3,15,15.1845,-0.25,-6.1595,21.9863,-0.25,-6.1595,18.7813,-0.25,3.2817],
// 4 15 -24.89 -0.25 -6.1627 -24.89 -0.25 3.6813 -27.5 -0.25 10 -27.5 -0.25 -10
  [4,15,-24.89,-0.25,-6.1627,-24.89,-0.25,3.6813,-27.5,-0.25,10,-27.5,-0.25,-10],
];
module ldraw_lib__6342851e(step=0, col=false, unit=2/5, alt=false, line=0.2, solid=!$preview)
    makepoly(ldraw_lib__6342851e(), step=step, col=col, unit=unit, alt=alt, line=line, solid=solid);
ldraw_lib__6342851e(line=0.2);
